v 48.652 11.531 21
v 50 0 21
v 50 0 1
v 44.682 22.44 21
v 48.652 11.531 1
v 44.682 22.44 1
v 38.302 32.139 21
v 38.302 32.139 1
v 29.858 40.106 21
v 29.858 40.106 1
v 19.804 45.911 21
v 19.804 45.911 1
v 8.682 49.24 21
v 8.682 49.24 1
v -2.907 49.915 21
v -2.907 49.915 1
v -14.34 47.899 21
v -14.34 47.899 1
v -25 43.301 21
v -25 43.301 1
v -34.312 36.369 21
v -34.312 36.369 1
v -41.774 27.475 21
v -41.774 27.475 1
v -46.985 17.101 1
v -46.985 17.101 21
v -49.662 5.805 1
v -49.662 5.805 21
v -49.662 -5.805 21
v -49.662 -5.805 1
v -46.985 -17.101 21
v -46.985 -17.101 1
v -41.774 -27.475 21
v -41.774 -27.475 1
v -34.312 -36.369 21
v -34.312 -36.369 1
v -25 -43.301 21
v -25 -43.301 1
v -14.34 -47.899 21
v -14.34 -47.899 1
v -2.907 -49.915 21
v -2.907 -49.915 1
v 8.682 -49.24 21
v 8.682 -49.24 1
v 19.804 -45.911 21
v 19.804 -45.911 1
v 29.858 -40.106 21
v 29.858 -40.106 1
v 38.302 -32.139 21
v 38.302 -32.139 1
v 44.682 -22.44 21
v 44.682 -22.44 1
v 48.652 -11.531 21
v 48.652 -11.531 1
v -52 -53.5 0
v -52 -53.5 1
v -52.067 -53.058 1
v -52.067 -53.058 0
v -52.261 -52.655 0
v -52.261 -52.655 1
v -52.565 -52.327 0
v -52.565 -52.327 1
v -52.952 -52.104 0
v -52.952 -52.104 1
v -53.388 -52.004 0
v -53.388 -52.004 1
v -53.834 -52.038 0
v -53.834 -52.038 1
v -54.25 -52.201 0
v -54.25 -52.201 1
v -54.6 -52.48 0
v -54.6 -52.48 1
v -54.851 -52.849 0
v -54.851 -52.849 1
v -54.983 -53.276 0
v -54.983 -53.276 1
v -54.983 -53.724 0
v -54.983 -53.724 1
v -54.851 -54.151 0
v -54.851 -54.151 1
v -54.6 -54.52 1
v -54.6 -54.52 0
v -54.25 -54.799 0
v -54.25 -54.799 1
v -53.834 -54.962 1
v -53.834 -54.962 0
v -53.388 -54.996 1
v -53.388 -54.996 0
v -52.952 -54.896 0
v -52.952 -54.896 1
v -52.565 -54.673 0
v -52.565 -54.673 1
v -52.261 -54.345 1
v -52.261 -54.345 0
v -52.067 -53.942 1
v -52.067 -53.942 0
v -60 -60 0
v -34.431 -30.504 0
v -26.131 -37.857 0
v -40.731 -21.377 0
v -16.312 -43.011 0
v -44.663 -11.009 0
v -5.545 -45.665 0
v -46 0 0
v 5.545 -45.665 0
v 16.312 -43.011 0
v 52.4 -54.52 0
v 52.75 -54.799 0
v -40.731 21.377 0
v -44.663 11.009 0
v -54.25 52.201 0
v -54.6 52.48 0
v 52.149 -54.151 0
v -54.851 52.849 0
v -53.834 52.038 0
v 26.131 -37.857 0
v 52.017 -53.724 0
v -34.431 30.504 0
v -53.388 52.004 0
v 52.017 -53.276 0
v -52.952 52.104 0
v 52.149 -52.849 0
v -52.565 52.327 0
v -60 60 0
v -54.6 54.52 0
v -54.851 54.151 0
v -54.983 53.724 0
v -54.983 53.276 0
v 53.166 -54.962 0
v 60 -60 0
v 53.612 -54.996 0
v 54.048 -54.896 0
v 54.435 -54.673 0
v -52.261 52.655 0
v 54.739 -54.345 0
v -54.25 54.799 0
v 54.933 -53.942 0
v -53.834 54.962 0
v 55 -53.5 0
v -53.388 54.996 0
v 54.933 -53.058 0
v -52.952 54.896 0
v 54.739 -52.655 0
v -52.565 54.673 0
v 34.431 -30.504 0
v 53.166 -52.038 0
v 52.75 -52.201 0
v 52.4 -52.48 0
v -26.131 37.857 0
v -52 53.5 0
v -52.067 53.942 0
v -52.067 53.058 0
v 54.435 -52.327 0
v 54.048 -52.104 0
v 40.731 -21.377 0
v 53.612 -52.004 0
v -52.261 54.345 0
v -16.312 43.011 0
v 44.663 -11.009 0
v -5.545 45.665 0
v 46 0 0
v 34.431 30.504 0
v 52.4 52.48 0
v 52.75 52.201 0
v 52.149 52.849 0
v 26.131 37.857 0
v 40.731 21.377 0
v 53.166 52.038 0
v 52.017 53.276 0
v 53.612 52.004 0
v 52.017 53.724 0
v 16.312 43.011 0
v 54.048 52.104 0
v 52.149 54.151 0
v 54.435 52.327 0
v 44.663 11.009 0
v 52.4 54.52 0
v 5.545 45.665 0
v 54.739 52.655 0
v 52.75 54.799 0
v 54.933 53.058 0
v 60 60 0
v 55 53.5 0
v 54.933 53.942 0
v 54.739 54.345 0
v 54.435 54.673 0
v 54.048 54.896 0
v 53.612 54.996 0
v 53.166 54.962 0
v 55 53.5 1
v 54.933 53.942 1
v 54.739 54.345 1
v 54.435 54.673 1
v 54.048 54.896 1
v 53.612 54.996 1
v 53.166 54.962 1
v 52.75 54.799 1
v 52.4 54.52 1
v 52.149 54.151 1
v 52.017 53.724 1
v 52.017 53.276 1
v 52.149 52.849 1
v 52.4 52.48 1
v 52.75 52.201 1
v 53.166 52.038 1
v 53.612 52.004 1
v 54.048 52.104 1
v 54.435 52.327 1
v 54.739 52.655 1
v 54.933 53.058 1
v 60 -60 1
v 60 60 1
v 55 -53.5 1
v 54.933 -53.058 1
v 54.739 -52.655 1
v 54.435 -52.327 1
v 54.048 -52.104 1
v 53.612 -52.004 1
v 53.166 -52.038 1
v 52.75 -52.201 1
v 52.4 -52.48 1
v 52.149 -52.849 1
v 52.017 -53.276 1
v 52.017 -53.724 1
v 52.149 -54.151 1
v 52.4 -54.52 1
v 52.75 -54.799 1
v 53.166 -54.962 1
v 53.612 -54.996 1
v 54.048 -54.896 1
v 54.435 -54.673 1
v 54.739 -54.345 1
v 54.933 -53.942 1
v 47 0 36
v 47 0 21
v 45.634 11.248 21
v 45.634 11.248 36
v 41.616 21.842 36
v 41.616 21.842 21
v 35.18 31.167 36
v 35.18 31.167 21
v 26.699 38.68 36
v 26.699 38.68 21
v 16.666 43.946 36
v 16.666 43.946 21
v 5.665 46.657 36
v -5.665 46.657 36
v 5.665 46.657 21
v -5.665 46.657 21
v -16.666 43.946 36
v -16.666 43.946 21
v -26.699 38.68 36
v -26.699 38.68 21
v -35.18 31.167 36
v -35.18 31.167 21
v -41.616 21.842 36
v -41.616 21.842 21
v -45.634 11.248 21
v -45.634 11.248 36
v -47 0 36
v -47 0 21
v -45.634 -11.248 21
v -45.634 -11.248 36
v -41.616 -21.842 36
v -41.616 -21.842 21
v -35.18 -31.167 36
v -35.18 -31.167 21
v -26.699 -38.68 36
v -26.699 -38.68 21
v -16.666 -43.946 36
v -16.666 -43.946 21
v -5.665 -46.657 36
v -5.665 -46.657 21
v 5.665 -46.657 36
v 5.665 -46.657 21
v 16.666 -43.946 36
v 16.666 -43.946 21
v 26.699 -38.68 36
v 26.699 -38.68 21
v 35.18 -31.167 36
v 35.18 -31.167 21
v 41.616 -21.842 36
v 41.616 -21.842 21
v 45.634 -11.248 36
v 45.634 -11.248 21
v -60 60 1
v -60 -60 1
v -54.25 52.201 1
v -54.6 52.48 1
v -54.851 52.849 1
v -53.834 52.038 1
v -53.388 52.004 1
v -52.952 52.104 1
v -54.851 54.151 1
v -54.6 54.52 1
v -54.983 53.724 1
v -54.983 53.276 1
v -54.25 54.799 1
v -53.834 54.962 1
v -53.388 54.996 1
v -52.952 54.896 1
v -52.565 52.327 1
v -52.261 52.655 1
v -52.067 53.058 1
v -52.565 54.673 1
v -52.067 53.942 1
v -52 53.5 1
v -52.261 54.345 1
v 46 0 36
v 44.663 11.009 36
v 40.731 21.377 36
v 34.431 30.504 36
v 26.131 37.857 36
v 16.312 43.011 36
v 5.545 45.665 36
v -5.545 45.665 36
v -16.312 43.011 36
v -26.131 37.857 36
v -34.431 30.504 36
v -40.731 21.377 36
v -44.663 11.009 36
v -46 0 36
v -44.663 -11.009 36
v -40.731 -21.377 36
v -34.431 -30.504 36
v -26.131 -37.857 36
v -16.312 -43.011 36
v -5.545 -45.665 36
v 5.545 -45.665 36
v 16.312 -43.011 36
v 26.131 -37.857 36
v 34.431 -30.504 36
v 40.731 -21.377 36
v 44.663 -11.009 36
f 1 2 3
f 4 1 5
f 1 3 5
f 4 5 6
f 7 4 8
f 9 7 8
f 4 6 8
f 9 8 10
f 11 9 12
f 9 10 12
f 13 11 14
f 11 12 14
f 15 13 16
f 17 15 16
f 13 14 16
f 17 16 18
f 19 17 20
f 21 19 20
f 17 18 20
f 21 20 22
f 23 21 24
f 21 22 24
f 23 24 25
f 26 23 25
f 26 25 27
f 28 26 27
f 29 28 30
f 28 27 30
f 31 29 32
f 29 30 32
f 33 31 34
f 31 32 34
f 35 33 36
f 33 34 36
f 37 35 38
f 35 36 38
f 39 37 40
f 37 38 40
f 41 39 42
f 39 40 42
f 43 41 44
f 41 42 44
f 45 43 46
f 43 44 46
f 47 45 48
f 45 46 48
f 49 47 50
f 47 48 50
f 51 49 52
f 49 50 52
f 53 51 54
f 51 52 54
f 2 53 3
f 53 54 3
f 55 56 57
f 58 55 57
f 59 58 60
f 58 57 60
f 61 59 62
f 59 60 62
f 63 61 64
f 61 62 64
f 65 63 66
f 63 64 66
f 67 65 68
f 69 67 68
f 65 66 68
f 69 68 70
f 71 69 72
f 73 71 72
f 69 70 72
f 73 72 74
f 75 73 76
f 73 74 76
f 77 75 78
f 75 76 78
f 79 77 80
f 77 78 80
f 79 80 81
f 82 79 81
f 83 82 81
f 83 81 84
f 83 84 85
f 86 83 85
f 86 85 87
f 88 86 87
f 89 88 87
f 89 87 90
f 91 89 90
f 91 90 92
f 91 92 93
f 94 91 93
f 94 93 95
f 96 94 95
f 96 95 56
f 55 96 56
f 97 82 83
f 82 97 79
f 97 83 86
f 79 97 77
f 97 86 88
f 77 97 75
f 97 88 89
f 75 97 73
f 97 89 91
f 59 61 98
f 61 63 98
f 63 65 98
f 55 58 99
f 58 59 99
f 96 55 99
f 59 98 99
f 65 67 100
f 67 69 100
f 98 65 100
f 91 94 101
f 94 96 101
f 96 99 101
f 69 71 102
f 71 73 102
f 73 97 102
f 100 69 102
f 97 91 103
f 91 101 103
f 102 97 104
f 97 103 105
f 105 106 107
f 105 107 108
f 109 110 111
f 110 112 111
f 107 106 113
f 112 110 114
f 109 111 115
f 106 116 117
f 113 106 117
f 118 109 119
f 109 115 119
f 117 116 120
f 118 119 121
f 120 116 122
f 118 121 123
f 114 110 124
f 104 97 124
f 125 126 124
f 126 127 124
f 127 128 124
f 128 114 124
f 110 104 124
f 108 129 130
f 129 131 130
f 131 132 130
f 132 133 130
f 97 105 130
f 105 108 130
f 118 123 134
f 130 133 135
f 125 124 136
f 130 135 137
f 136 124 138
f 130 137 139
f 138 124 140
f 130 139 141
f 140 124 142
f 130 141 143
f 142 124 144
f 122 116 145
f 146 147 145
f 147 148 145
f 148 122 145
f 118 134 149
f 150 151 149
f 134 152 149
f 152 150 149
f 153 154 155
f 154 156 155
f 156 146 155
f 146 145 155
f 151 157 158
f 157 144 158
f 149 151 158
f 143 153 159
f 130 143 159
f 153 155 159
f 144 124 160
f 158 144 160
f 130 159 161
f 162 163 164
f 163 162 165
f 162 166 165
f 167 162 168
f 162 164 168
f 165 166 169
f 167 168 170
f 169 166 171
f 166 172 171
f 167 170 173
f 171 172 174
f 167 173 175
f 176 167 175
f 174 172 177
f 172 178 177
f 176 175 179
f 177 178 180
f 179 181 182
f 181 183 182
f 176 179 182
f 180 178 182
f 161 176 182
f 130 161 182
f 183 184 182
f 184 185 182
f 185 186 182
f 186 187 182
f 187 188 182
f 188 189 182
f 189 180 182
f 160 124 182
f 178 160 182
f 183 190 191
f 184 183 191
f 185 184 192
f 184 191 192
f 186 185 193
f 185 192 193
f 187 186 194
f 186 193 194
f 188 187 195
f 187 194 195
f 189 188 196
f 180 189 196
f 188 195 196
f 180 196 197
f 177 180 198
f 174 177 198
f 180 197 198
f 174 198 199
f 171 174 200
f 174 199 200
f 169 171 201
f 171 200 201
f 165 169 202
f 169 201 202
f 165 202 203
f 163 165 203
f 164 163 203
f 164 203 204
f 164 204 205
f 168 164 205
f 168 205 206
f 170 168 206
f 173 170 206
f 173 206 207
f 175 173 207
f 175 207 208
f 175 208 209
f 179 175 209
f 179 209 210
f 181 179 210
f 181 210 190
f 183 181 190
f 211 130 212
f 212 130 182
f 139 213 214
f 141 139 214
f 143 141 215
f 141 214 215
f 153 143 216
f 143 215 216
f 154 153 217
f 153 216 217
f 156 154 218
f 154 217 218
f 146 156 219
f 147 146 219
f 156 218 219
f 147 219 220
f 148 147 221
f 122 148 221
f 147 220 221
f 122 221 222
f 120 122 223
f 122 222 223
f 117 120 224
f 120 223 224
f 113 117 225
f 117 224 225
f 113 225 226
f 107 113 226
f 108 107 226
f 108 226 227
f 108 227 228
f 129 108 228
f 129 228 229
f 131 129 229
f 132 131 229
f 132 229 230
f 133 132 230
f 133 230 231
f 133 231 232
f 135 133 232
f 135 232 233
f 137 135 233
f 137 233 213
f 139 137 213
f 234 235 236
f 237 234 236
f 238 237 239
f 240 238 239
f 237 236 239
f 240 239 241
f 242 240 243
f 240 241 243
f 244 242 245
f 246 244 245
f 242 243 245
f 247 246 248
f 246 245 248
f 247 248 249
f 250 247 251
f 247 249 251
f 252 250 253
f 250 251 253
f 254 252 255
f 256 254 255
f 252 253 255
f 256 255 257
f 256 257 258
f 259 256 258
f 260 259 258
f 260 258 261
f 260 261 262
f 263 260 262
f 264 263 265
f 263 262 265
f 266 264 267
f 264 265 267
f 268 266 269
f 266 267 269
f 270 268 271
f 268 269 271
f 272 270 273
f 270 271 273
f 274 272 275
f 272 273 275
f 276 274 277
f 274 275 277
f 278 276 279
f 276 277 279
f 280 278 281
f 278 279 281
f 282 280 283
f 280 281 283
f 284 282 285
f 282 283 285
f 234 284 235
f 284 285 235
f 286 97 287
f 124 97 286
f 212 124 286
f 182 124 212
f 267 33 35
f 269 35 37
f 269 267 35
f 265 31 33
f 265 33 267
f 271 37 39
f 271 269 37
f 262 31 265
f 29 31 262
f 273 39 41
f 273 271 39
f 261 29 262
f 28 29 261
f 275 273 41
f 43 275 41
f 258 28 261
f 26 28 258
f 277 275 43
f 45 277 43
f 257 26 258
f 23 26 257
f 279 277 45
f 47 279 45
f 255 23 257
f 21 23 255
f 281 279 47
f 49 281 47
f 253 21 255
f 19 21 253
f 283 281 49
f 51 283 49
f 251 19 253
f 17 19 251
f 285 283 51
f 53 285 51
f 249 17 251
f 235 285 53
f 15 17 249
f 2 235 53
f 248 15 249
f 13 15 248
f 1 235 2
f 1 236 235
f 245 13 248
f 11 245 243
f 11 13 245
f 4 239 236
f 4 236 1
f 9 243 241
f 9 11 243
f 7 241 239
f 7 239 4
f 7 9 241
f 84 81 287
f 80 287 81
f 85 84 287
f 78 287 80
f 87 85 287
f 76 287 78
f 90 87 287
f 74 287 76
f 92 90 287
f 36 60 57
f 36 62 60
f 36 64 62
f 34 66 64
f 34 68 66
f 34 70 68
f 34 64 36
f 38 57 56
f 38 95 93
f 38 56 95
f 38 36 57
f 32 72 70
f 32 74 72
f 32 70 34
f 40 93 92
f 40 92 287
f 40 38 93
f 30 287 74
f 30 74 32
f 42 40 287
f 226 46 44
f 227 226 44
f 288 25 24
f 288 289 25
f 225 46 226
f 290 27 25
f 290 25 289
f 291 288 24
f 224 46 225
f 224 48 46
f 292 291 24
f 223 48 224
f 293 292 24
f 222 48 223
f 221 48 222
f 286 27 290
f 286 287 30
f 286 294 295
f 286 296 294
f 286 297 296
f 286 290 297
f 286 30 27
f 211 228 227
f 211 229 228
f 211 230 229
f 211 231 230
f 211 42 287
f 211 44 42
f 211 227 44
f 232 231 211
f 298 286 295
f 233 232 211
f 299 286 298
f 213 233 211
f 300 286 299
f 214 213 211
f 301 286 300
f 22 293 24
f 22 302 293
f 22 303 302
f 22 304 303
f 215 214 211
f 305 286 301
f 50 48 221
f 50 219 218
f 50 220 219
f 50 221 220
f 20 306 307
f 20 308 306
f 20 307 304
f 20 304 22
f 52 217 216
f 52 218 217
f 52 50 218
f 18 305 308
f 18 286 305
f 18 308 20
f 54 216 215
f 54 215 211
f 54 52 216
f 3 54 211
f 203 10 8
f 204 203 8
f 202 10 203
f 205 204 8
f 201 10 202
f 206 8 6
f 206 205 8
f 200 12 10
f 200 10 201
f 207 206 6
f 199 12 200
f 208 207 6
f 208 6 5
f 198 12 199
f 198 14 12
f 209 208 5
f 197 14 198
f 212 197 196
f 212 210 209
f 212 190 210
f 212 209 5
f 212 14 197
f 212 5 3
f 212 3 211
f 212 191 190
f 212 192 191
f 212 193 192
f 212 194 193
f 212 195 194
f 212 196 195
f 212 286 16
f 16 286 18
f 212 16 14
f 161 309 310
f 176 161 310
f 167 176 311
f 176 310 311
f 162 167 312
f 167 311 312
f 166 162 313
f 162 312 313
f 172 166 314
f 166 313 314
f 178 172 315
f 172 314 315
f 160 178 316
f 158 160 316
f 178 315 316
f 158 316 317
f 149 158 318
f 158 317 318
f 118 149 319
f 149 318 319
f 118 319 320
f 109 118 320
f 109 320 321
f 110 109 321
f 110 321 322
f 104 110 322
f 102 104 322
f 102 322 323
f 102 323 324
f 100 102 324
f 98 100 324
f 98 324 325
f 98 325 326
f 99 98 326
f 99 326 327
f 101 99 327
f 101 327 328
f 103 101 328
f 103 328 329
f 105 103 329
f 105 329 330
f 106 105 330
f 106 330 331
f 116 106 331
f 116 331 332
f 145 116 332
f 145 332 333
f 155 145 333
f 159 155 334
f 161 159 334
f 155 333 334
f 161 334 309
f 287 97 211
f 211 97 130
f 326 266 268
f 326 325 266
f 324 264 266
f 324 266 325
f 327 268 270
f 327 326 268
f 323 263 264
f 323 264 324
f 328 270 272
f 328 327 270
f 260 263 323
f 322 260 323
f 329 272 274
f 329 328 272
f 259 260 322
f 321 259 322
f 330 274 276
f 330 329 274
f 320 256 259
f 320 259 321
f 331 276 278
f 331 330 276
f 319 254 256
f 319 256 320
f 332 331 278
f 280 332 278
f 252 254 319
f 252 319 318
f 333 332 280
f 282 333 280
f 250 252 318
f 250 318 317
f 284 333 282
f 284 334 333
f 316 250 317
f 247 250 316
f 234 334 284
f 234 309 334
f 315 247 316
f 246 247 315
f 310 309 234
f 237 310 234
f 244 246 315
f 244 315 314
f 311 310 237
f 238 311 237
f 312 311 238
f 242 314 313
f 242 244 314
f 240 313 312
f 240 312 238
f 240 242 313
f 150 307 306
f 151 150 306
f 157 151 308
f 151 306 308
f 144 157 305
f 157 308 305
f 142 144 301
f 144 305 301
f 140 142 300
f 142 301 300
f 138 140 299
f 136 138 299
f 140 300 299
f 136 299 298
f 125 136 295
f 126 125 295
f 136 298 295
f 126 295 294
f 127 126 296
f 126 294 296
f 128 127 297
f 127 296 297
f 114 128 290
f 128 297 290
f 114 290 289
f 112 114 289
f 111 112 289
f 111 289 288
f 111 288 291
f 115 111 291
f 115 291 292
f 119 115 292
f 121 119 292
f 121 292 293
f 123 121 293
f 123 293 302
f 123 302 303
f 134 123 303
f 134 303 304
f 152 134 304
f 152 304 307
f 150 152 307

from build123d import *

# Parameters (mm, degrees)
F0_W     = 120
F0_H     = 120
F1_DEPTH = 1
F2_R     = 50
F3_DEPTH = 20
F4_R     = 47
F5_DEPTH = 15
F6_R     = 46
F7_DEPTH = 56.8
F8_R     = 1.5
F9_DEPTH = 25


with BuildPart() as f1:
    # F0 (on Top) → F1 (new body)
    with BuildSketch(Plane.XY):
        Rectangle(F0_W, F0_H)
    extrude(amount=F1_DEPTH)

    # F2 (on face) → F3 (join)
    with BuildSketch(Plane.XY.offset(1)):
        Circle(F2_R)
    extrude(amount=F3_DEPTH)

    # F4 (on face) → F5 (join)
    with BuildSketch(Plane.XY.offset(21)):
        Circle(F4_R)
    extrude(amount=F5_DEPTH)

    # F6 (on face) → F7 (cut)
    with BuildSketch(Plane.XY.offset(36)):
        Circle(F6_R)
    extrude(amount=-F7_DEPTH, mode=Mode.SUBTRACT)

    # F8 (on face) → F9 (cut)
    with BuildSketch(Plane.XY.offset(1)):
        with Locations((-53.5, -53.5)):
            Circle(F8_R)
        with Locations((53.5, -53.5)):
            Circle(F8_R)
        with Locations((-53.5, 53.5)):
            Circle(F8_R)
        with Locations((53.5, 53.5)):
            Circle(F8_R)
    extrude(amount=-F9_DEPTH, mode=Mode.SUBTRACT)


solid = f1.part
